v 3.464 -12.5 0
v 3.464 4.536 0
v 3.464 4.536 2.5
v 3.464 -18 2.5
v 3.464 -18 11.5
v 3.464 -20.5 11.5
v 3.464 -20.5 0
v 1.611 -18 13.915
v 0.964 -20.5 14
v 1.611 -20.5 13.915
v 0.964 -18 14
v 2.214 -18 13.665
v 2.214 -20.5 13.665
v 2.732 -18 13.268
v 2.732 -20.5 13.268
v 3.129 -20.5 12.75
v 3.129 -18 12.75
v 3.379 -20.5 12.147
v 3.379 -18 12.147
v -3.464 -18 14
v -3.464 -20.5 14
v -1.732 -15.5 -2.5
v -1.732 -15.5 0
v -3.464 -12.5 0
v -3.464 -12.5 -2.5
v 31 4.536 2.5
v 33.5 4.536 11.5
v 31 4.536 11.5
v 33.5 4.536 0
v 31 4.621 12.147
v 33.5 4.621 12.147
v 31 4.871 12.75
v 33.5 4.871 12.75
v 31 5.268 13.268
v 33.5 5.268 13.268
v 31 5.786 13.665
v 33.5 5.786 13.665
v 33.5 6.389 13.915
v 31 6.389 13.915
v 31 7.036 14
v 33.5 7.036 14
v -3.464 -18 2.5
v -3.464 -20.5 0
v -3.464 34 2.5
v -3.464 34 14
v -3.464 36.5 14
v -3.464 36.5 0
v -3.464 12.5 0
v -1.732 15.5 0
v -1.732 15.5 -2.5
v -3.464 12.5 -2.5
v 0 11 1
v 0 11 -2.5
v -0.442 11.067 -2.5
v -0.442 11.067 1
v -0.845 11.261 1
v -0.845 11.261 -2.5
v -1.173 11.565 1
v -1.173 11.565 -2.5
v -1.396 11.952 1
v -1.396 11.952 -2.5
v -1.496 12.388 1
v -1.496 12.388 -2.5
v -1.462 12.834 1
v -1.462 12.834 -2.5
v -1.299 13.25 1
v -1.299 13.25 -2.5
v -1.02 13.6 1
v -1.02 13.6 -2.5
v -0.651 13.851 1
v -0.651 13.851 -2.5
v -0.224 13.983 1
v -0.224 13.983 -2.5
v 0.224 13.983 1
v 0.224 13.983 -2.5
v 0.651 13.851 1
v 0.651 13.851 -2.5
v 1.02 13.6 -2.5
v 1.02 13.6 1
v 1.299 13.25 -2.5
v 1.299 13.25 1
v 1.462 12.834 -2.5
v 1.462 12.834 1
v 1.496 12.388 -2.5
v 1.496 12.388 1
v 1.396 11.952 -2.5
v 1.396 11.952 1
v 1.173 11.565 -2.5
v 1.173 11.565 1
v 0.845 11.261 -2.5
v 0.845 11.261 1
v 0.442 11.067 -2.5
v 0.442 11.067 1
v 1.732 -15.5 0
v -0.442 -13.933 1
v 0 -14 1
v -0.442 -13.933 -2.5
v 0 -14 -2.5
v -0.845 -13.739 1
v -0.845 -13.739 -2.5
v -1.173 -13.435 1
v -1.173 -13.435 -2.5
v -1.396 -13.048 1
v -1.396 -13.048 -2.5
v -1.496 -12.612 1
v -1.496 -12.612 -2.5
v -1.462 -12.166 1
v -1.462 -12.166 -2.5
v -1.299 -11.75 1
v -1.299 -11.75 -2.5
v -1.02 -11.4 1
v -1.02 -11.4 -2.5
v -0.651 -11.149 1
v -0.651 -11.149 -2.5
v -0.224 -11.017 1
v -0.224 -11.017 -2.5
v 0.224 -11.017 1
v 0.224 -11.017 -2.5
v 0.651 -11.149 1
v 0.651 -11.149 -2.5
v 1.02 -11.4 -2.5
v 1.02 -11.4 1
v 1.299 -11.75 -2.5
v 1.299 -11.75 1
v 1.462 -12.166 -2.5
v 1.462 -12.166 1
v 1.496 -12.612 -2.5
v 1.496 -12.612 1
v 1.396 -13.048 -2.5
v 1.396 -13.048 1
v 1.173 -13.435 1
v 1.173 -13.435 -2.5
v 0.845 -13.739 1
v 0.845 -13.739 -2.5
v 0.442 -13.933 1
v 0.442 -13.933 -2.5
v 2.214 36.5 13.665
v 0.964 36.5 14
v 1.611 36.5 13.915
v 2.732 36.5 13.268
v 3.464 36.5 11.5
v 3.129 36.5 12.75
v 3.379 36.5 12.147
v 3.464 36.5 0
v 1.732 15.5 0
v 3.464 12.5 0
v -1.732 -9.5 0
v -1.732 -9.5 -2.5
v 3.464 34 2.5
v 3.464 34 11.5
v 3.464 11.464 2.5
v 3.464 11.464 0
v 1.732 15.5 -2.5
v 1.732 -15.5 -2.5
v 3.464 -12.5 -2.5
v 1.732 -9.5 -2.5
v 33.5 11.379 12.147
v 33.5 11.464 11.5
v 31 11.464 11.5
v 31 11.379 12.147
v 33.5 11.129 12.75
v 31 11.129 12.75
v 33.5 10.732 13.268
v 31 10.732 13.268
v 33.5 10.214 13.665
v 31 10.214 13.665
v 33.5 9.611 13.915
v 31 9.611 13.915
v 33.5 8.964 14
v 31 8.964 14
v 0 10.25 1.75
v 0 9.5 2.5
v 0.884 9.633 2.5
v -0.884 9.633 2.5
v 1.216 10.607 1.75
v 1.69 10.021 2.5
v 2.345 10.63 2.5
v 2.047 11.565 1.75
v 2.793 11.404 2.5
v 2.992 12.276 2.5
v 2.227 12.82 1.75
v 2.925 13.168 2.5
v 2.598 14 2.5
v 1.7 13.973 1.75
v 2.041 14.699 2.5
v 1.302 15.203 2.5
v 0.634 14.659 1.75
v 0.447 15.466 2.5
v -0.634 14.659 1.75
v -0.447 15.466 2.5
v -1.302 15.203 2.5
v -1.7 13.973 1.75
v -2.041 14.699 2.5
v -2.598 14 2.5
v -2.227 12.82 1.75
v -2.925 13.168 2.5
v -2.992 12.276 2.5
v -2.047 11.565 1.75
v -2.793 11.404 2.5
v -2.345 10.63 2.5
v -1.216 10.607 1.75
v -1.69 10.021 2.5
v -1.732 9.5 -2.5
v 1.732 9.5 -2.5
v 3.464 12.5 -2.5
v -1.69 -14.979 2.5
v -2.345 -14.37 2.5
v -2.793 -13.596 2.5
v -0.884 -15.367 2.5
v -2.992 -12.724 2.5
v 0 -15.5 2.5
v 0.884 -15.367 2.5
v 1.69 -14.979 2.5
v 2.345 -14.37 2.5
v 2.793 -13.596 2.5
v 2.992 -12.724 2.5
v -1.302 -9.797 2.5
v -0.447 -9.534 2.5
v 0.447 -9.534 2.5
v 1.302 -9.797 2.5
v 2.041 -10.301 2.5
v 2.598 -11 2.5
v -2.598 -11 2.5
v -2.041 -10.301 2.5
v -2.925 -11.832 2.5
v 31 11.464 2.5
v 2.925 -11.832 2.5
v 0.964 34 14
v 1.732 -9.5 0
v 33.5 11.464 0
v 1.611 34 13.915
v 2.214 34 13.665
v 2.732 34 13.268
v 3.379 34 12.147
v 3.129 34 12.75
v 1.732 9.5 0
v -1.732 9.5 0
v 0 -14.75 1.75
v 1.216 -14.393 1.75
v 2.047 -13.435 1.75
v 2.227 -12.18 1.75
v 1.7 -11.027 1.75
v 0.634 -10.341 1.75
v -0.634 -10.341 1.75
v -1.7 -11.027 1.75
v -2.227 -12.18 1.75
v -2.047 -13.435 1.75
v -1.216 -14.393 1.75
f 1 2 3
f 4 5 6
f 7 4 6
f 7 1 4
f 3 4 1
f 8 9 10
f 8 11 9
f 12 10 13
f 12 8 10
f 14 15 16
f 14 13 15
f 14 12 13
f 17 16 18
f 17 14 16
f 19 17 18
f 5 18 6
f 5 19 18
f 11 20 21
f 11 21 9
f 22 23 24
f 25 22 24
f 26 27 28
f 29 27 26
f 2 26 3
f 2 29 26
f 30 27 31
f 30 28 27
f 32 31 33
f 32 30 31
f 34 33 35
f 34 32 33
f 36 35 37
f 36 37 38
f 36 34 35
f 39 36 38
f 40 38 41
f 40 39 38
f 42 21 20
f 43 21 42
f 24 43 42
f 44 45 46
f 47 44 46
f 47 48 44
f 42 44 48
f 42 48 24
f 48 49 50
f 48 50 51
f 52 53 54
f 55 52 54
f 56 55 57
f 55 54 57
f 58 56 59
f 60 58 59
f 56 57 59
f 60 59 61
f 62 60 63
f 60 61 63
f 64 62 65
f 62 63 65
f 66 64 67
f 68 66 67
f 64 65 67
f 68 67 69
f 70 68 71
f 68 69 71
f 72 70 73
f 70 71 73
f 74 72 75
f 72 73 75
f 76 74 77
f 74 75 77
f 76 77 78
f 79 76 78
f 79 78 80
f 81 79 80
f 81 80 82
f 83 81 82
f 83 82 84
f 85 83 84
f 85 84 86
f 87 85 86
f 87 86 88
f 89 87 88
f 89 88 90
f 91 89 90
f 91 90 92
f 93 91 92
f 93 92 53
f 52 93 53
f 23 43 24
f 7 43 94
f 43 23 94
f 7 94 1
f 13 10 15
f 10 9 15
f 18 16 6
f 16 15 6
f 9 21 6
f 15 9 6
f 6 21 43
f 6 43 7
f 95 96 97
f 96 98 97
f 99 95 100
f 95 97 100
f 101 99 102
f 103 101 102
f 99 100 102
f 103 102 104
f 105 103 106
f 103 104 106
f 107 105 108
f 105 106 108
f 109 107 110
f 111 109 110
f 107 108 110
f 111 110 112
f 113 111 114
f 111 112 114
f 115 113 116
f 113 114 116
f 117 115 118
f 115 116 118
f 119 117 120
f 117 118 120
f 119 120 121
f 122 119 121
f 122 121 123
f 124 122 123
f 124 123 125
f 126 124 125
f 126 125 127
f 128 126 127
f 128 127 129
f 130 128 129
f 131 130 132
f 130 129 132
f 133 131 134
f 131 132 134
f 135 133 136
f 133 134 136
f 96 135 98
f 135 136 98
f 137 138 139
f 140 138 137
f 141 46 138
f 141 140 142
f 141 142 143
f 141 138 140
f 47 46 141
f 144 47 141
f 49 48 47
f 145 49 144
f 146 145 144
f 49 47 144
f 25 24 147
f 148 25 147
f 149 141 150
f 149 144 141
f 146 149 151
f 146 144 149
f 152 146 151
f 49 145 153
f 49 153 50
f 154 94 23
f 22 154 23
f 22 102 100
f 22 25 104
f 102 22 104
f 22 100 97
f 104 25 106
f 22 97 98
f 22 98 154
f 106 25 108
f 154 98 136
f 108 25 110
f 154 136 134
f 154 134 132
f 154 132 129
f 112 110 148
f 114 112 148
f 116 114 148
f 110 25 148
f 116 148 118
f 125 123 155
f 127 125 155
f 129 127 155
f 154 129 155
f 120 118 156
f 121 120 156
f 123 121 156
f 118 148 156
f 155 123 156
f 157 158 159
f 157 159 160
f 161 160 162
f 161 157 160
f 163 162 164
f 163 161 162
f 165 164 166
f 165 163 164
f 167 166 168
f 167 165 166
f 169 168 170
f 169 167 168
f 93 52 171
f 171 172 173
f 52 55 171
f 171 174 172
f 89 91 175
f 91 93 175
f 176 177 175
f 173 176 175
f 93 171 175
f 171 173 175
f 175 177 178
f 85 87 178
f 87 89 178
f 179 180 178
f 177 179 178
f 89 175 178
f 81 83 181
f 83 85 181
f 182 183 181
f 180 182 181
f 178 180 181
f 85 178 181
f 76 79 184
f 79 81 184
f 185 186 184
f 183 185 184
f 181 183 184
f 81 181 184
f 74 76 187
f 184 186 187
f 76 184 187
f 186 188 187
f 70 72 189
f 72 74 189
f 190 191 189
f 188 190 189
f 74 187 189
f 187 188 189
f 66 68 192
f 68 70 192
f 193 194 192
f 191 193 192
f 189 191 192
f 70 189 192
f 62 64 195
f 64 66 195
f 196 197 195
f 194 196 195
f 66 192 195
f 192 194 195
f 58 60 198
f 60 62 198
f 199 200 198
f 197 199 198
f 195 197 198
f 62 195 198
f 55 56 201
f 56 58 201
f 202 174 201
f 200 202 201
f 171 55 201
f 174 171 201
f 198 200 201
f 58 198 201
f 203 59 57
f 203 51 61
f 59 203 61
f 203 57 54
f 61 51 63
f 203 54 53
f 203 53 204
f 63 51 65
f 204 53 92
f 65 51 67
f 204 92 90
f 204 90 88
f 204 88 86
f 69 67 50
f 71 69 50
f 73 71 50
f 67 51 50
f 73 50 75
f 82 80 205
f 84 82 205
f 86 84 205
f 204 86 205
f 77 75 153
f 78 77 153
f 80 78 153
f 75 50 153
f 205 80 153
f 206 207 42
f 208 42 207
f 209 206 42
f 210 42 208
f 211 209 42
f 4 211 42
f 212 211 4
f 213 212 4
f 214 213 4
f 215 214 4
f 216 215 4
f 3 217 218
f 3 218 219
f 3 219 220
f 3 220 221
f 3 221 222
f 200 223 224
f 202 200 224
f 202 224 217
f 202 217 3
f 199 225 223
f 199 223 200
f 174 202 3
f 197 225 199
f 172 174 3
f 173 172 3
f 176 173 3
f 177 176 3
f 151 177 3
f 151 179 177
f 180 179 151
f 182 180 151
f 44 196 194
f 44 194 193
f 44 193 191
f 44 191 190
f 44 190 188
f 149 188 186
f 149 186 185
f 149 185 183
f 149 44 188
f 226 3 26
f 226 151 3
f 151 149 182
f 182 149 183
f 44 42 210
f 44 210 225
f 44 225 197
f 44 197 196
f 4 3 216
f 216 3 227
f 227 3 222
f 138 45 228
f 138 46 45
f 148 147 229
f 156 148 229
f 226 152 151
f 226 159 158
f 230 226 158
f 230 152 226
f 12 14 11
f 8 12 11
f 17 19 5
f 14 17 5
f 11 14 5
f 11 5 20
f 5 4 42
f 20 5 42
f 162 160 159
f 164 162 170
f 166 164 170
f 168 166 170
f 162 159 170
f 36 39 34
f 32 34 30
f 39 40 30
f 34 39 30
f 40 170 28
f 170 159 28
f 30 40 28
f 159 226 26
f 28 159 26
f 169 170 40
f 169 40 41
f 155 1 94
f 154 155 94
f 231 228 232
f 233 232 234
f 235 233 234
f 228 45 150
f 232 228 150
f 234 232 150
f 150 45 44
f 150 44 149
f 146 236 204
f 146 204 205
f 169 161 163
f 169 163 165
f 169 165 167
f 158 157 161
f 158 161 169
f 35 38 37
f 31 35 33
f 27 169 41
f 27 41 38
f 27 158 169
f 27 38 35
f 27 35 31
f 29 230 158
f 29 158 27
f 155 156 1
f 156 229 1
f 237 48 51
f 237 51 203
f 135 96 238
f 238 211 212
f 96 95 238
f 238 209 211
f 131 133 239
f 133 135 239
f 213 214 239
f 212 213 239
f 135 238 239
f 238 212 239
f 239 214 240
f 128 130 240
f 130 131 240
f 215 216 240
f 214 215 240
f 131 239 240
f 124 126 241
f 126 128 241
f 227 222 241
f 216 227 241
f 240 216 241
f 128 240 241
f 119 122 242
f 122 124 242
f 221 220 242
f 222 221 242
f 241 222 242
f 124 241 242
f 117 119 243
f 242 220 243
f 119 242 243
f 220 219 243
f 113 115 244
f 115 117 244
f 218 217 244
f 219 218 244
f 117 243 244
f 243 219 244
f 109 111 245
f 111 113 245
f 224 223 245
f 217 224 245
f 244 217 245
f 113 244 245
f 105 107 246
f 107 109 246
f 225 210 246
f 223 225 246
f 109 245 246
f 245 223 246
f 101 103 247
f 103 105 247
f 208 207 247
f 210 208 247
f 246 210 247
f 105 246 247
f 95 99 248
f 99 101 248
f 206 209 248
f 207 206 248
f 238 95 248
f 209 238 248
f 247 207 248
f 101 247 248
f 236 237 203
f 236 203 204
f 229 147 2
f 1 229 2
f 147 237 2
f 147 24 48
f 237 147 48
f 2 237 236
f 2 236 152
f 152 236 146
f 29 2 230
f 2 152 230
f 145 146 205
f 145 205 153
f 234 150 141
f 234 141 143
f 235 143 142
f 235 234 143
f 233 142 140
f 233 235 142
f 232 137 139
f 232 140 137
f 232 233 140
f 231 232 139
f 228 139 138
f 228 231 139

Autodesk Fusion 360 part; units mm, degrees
sketch "スケッチ1" plane through (0, 0, 0) normal (0, 0, 1) x (1, 0, 0) in component "Component"
  line L0 (-3.4641, 12.5) -> (-1.7321, 9.5)
  line L1 (-1.7321, 9.5) -> (1.7321, 9.5)
  line L2 (1.7321, 9.5) -> (3.4641, 12.5)
  line L3 (3.4641, 12.5) -> (1.7321, 15.5)
  line L4 (1.7321, 15.5) -> (-1.7321, 15.5)
  line L5 (-1.7321, 15.5) -> (-3.4641, 12.5)
  line L6 (0, 150) -> (0, -150) construction
  line L7 (-100, 0) -> (234.7346, 0) construction
  line L8 (-3.4641, -12.5) -> (-1.7321, -9.5)
  line L9 (-1.7321, -9.5) -> (1.7321, -9.5)
  line L10 (3.4641, -12.5) -> (1.7321, -15.5)
  line L11 (-1.7321, -15.5) -> (-3.4641, -12.5)
  line L12 (1.7321, -9.5) -> (3.4641, -12.5)
  line L13 (1.7321, -15.5) -> (-1.7321, -15.5)
  line L14 (-31, 8) -> (50, 8)
  line L15 (-3.4641, 12.5) -> (-3.4641, 34)
  line L16 (-3.4641, 34) -> (3.4641, 34)
  line L17 (3.4641, 34) -> (3.4641, -18)
  line L18 (3.4641, -18) -> (-3.4641, -18)
  line L19 (-3.4641, -18) -> (-3.4641, 12.5)
  line L20 (-3.4641, 34) -> (-3.4641, 36.5)
  line L21 (-3.4641, 36.5) -> (3.4641, 36.5)
  line L22 (3.4641, 36.5) -> (3.4641, 34)
  line L23 (-3.4641, -18) -> (-3.4641, -20.5)
  line L24 (-3.4641, -20.5) -> (3.4641, -20.5)
  line L25 (3.4641, -20.5) -> (3.4641, -18)
  line L26 (3.4641, 11.4641) -> (31, 11.4641)
  line L27 (31, 11.4641) -> (31, 4.5359)
  line L28 (31, 4.5359) -> (3.4641, 4.5359)
  line L29 (31, 11.4641) -> (33.5, 11.4641)
  line L30 (33.5, 11.4641) -> (33.5, 4.5359)
  line L31 (33.5, 4.5359) -> (31, 4.5359)
  point P0 (0, 12.5)
  point P1 (0, -12.5)
  dimension "d1" = 6
  dimension "d2" = 25
  dimension "d3" = 8
  dimension "d4" = 52
  dimension "d5" = 2.5
  dimension "d6" = 2.5
  dimension "d7" = 31
extrude "押し出し1" add sketch "スケッチ1" against normal blind 2.5 contours L0 L1 L2 L3 L4 L5 | L8 L9 L10 L11 L12 L13 makes body 1 at (-0.5774, 11.5, 0) makes body 2 at (-0.5774, -11.5, 0) in component "Component"
extrude "押し出し2" add sketch "スケッチ1" along normal blind 2.5 contours L0 L1 L2 L3 L4 L5 | L3 L4 L5 L15 L16 L17 | L0 L1 L2 L14 L17 L19 | L8 L9 L12 L14 L17 L19 | L14 L17 L26 L27 | L14 L17 L27 L28 | L8 L9 L10 L11 L12 L13 | L10 L11 L13 L17 L18 L19 bodies 1 2 in component "Component"
extrude "押し出し3" add sketch "スケッチ1" along normal blind 14 contours L16 L20 L21 L22 | L14 L27 L29 L30 | L14 L27 L30 L31 | L18 L23 L24 L25 bodies 1 in component "Component"
sketch "スケッチ2" plane through (0, 0, 2.5) normal (0, 0, 1) x (-1, 0, 0) in component "Component"
  line L0 (-31, -4.5359) -> (-31, -11.4641)
  line L1 (-31, -11.4641) -> (-3.4641, -11.4641)
  line L2 (-3.4641, -11.4641) -> (-3.4641, -34)
  line L3 (-3.4641, -34) -> (3.4641, -34)
  line L4 (3.4641, -34) -> (3.4641, 18)
  line L5 (3.4641, 18) -> (-3.4641, 18)
  line L6 (-3.4641, 18) -> (-3.4641, -4.5359)
  line L7 (-3.4641, -4.5359) -> (-31, -4.5359)
  circle A0 centre (0, -12.5) radius 1.5
  circle A1 centre (0, 12.5) radius 1.5
  point P0 (0, -12.5)
  point P1 (0, 12.5)
  dimension "d14" = 3
hole "穴1" at (0, 12.5, 2.5) at (0, -12.5, 2.5) direction (0, 0, -1) diameter 3 depth 10 tip angle 118 countersink diameter 6 countersink angle 90 bodies 1 in component "Component"
fillet "フィレット1" radius 2.5 4 edges at (3.4641, 35.25, 14) (3.4641, -19.25, 14) (32.25, 4.5359, 14) (32.25, 11.4641, 14) on bodies 1 in component "Component"
component "Component" placed x (1, 0, 0) y (0, 1, 0) z (0, 0, 1) at (0, 0, 0)
